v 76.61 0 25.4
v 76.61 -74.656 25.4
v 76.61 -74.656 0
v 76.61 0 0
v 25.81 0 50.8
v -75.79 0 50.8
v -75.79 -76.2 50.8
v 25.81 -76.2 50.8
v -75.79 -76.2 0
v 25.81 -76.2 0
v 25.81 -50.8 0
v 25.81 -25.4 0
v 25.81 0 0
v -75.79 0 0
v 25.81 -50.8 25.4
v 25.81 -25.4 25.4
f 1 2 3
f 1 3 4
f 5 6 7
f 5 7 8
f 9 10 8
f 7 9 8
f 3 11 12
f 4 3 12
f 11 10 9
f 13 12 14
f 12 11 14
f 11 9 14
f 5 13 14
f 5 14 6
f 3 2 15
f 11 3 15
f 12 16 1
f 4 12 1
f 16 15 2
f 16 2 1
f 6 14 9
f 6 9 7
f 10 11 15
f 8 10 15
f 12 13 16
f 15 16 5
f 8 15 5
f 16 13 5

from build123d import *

# Parameters (mm, degrees)
F0_W     = 101.6
F0_H     = 50.8
F1_DEPTH = 76.2
F2_W     = 76.2
F2_H     = 25.4
F3_DEPTH = 50.8
F5_DEPTH = 25.4
F7_DEPTH = 25.4


with BuildPart() as f1:
    # F0 (on Front) → F1 (new body)
    with BuildSketch(Plane.XZ):
        with Locations((-24.98975, 25.4)):
            Rectangle(F0_W, F0_H)
    extrude(amount=F1_DEPTH)

    # F2 (on face) → F3 (join)
    with BuildSketch(Plane.YZ.offset(25.81025)):
        with Locations((-38.1, 12.7)):
            Rectangle(F2_W, F2_H)
    extrude(amount=F3_DEPTH)

    # F4 (on face) → F5 (cut)
    with BuildSketch(Plane.XY.offset(25.4)):
        Polygon((25.81025, -50.8), (25.81025, -76.2), (76.61025, -76.2), (76.61025, -74.655533), align=None)
    extrude(amount=-F5_DEPTH, mode=Mode.SUBTRACT)

    # F6 (on face) → F7 (cut)
    with BuildSketch(Plane.XY.offset(25.4)):
        Polygon((25.81025, 0), (25.81025, -25.4), (76.61025, 0), align=None)
    extrude(amount=-F7_DEPTH, mode=Mode.SUBTRACT)


solid = f1.part
